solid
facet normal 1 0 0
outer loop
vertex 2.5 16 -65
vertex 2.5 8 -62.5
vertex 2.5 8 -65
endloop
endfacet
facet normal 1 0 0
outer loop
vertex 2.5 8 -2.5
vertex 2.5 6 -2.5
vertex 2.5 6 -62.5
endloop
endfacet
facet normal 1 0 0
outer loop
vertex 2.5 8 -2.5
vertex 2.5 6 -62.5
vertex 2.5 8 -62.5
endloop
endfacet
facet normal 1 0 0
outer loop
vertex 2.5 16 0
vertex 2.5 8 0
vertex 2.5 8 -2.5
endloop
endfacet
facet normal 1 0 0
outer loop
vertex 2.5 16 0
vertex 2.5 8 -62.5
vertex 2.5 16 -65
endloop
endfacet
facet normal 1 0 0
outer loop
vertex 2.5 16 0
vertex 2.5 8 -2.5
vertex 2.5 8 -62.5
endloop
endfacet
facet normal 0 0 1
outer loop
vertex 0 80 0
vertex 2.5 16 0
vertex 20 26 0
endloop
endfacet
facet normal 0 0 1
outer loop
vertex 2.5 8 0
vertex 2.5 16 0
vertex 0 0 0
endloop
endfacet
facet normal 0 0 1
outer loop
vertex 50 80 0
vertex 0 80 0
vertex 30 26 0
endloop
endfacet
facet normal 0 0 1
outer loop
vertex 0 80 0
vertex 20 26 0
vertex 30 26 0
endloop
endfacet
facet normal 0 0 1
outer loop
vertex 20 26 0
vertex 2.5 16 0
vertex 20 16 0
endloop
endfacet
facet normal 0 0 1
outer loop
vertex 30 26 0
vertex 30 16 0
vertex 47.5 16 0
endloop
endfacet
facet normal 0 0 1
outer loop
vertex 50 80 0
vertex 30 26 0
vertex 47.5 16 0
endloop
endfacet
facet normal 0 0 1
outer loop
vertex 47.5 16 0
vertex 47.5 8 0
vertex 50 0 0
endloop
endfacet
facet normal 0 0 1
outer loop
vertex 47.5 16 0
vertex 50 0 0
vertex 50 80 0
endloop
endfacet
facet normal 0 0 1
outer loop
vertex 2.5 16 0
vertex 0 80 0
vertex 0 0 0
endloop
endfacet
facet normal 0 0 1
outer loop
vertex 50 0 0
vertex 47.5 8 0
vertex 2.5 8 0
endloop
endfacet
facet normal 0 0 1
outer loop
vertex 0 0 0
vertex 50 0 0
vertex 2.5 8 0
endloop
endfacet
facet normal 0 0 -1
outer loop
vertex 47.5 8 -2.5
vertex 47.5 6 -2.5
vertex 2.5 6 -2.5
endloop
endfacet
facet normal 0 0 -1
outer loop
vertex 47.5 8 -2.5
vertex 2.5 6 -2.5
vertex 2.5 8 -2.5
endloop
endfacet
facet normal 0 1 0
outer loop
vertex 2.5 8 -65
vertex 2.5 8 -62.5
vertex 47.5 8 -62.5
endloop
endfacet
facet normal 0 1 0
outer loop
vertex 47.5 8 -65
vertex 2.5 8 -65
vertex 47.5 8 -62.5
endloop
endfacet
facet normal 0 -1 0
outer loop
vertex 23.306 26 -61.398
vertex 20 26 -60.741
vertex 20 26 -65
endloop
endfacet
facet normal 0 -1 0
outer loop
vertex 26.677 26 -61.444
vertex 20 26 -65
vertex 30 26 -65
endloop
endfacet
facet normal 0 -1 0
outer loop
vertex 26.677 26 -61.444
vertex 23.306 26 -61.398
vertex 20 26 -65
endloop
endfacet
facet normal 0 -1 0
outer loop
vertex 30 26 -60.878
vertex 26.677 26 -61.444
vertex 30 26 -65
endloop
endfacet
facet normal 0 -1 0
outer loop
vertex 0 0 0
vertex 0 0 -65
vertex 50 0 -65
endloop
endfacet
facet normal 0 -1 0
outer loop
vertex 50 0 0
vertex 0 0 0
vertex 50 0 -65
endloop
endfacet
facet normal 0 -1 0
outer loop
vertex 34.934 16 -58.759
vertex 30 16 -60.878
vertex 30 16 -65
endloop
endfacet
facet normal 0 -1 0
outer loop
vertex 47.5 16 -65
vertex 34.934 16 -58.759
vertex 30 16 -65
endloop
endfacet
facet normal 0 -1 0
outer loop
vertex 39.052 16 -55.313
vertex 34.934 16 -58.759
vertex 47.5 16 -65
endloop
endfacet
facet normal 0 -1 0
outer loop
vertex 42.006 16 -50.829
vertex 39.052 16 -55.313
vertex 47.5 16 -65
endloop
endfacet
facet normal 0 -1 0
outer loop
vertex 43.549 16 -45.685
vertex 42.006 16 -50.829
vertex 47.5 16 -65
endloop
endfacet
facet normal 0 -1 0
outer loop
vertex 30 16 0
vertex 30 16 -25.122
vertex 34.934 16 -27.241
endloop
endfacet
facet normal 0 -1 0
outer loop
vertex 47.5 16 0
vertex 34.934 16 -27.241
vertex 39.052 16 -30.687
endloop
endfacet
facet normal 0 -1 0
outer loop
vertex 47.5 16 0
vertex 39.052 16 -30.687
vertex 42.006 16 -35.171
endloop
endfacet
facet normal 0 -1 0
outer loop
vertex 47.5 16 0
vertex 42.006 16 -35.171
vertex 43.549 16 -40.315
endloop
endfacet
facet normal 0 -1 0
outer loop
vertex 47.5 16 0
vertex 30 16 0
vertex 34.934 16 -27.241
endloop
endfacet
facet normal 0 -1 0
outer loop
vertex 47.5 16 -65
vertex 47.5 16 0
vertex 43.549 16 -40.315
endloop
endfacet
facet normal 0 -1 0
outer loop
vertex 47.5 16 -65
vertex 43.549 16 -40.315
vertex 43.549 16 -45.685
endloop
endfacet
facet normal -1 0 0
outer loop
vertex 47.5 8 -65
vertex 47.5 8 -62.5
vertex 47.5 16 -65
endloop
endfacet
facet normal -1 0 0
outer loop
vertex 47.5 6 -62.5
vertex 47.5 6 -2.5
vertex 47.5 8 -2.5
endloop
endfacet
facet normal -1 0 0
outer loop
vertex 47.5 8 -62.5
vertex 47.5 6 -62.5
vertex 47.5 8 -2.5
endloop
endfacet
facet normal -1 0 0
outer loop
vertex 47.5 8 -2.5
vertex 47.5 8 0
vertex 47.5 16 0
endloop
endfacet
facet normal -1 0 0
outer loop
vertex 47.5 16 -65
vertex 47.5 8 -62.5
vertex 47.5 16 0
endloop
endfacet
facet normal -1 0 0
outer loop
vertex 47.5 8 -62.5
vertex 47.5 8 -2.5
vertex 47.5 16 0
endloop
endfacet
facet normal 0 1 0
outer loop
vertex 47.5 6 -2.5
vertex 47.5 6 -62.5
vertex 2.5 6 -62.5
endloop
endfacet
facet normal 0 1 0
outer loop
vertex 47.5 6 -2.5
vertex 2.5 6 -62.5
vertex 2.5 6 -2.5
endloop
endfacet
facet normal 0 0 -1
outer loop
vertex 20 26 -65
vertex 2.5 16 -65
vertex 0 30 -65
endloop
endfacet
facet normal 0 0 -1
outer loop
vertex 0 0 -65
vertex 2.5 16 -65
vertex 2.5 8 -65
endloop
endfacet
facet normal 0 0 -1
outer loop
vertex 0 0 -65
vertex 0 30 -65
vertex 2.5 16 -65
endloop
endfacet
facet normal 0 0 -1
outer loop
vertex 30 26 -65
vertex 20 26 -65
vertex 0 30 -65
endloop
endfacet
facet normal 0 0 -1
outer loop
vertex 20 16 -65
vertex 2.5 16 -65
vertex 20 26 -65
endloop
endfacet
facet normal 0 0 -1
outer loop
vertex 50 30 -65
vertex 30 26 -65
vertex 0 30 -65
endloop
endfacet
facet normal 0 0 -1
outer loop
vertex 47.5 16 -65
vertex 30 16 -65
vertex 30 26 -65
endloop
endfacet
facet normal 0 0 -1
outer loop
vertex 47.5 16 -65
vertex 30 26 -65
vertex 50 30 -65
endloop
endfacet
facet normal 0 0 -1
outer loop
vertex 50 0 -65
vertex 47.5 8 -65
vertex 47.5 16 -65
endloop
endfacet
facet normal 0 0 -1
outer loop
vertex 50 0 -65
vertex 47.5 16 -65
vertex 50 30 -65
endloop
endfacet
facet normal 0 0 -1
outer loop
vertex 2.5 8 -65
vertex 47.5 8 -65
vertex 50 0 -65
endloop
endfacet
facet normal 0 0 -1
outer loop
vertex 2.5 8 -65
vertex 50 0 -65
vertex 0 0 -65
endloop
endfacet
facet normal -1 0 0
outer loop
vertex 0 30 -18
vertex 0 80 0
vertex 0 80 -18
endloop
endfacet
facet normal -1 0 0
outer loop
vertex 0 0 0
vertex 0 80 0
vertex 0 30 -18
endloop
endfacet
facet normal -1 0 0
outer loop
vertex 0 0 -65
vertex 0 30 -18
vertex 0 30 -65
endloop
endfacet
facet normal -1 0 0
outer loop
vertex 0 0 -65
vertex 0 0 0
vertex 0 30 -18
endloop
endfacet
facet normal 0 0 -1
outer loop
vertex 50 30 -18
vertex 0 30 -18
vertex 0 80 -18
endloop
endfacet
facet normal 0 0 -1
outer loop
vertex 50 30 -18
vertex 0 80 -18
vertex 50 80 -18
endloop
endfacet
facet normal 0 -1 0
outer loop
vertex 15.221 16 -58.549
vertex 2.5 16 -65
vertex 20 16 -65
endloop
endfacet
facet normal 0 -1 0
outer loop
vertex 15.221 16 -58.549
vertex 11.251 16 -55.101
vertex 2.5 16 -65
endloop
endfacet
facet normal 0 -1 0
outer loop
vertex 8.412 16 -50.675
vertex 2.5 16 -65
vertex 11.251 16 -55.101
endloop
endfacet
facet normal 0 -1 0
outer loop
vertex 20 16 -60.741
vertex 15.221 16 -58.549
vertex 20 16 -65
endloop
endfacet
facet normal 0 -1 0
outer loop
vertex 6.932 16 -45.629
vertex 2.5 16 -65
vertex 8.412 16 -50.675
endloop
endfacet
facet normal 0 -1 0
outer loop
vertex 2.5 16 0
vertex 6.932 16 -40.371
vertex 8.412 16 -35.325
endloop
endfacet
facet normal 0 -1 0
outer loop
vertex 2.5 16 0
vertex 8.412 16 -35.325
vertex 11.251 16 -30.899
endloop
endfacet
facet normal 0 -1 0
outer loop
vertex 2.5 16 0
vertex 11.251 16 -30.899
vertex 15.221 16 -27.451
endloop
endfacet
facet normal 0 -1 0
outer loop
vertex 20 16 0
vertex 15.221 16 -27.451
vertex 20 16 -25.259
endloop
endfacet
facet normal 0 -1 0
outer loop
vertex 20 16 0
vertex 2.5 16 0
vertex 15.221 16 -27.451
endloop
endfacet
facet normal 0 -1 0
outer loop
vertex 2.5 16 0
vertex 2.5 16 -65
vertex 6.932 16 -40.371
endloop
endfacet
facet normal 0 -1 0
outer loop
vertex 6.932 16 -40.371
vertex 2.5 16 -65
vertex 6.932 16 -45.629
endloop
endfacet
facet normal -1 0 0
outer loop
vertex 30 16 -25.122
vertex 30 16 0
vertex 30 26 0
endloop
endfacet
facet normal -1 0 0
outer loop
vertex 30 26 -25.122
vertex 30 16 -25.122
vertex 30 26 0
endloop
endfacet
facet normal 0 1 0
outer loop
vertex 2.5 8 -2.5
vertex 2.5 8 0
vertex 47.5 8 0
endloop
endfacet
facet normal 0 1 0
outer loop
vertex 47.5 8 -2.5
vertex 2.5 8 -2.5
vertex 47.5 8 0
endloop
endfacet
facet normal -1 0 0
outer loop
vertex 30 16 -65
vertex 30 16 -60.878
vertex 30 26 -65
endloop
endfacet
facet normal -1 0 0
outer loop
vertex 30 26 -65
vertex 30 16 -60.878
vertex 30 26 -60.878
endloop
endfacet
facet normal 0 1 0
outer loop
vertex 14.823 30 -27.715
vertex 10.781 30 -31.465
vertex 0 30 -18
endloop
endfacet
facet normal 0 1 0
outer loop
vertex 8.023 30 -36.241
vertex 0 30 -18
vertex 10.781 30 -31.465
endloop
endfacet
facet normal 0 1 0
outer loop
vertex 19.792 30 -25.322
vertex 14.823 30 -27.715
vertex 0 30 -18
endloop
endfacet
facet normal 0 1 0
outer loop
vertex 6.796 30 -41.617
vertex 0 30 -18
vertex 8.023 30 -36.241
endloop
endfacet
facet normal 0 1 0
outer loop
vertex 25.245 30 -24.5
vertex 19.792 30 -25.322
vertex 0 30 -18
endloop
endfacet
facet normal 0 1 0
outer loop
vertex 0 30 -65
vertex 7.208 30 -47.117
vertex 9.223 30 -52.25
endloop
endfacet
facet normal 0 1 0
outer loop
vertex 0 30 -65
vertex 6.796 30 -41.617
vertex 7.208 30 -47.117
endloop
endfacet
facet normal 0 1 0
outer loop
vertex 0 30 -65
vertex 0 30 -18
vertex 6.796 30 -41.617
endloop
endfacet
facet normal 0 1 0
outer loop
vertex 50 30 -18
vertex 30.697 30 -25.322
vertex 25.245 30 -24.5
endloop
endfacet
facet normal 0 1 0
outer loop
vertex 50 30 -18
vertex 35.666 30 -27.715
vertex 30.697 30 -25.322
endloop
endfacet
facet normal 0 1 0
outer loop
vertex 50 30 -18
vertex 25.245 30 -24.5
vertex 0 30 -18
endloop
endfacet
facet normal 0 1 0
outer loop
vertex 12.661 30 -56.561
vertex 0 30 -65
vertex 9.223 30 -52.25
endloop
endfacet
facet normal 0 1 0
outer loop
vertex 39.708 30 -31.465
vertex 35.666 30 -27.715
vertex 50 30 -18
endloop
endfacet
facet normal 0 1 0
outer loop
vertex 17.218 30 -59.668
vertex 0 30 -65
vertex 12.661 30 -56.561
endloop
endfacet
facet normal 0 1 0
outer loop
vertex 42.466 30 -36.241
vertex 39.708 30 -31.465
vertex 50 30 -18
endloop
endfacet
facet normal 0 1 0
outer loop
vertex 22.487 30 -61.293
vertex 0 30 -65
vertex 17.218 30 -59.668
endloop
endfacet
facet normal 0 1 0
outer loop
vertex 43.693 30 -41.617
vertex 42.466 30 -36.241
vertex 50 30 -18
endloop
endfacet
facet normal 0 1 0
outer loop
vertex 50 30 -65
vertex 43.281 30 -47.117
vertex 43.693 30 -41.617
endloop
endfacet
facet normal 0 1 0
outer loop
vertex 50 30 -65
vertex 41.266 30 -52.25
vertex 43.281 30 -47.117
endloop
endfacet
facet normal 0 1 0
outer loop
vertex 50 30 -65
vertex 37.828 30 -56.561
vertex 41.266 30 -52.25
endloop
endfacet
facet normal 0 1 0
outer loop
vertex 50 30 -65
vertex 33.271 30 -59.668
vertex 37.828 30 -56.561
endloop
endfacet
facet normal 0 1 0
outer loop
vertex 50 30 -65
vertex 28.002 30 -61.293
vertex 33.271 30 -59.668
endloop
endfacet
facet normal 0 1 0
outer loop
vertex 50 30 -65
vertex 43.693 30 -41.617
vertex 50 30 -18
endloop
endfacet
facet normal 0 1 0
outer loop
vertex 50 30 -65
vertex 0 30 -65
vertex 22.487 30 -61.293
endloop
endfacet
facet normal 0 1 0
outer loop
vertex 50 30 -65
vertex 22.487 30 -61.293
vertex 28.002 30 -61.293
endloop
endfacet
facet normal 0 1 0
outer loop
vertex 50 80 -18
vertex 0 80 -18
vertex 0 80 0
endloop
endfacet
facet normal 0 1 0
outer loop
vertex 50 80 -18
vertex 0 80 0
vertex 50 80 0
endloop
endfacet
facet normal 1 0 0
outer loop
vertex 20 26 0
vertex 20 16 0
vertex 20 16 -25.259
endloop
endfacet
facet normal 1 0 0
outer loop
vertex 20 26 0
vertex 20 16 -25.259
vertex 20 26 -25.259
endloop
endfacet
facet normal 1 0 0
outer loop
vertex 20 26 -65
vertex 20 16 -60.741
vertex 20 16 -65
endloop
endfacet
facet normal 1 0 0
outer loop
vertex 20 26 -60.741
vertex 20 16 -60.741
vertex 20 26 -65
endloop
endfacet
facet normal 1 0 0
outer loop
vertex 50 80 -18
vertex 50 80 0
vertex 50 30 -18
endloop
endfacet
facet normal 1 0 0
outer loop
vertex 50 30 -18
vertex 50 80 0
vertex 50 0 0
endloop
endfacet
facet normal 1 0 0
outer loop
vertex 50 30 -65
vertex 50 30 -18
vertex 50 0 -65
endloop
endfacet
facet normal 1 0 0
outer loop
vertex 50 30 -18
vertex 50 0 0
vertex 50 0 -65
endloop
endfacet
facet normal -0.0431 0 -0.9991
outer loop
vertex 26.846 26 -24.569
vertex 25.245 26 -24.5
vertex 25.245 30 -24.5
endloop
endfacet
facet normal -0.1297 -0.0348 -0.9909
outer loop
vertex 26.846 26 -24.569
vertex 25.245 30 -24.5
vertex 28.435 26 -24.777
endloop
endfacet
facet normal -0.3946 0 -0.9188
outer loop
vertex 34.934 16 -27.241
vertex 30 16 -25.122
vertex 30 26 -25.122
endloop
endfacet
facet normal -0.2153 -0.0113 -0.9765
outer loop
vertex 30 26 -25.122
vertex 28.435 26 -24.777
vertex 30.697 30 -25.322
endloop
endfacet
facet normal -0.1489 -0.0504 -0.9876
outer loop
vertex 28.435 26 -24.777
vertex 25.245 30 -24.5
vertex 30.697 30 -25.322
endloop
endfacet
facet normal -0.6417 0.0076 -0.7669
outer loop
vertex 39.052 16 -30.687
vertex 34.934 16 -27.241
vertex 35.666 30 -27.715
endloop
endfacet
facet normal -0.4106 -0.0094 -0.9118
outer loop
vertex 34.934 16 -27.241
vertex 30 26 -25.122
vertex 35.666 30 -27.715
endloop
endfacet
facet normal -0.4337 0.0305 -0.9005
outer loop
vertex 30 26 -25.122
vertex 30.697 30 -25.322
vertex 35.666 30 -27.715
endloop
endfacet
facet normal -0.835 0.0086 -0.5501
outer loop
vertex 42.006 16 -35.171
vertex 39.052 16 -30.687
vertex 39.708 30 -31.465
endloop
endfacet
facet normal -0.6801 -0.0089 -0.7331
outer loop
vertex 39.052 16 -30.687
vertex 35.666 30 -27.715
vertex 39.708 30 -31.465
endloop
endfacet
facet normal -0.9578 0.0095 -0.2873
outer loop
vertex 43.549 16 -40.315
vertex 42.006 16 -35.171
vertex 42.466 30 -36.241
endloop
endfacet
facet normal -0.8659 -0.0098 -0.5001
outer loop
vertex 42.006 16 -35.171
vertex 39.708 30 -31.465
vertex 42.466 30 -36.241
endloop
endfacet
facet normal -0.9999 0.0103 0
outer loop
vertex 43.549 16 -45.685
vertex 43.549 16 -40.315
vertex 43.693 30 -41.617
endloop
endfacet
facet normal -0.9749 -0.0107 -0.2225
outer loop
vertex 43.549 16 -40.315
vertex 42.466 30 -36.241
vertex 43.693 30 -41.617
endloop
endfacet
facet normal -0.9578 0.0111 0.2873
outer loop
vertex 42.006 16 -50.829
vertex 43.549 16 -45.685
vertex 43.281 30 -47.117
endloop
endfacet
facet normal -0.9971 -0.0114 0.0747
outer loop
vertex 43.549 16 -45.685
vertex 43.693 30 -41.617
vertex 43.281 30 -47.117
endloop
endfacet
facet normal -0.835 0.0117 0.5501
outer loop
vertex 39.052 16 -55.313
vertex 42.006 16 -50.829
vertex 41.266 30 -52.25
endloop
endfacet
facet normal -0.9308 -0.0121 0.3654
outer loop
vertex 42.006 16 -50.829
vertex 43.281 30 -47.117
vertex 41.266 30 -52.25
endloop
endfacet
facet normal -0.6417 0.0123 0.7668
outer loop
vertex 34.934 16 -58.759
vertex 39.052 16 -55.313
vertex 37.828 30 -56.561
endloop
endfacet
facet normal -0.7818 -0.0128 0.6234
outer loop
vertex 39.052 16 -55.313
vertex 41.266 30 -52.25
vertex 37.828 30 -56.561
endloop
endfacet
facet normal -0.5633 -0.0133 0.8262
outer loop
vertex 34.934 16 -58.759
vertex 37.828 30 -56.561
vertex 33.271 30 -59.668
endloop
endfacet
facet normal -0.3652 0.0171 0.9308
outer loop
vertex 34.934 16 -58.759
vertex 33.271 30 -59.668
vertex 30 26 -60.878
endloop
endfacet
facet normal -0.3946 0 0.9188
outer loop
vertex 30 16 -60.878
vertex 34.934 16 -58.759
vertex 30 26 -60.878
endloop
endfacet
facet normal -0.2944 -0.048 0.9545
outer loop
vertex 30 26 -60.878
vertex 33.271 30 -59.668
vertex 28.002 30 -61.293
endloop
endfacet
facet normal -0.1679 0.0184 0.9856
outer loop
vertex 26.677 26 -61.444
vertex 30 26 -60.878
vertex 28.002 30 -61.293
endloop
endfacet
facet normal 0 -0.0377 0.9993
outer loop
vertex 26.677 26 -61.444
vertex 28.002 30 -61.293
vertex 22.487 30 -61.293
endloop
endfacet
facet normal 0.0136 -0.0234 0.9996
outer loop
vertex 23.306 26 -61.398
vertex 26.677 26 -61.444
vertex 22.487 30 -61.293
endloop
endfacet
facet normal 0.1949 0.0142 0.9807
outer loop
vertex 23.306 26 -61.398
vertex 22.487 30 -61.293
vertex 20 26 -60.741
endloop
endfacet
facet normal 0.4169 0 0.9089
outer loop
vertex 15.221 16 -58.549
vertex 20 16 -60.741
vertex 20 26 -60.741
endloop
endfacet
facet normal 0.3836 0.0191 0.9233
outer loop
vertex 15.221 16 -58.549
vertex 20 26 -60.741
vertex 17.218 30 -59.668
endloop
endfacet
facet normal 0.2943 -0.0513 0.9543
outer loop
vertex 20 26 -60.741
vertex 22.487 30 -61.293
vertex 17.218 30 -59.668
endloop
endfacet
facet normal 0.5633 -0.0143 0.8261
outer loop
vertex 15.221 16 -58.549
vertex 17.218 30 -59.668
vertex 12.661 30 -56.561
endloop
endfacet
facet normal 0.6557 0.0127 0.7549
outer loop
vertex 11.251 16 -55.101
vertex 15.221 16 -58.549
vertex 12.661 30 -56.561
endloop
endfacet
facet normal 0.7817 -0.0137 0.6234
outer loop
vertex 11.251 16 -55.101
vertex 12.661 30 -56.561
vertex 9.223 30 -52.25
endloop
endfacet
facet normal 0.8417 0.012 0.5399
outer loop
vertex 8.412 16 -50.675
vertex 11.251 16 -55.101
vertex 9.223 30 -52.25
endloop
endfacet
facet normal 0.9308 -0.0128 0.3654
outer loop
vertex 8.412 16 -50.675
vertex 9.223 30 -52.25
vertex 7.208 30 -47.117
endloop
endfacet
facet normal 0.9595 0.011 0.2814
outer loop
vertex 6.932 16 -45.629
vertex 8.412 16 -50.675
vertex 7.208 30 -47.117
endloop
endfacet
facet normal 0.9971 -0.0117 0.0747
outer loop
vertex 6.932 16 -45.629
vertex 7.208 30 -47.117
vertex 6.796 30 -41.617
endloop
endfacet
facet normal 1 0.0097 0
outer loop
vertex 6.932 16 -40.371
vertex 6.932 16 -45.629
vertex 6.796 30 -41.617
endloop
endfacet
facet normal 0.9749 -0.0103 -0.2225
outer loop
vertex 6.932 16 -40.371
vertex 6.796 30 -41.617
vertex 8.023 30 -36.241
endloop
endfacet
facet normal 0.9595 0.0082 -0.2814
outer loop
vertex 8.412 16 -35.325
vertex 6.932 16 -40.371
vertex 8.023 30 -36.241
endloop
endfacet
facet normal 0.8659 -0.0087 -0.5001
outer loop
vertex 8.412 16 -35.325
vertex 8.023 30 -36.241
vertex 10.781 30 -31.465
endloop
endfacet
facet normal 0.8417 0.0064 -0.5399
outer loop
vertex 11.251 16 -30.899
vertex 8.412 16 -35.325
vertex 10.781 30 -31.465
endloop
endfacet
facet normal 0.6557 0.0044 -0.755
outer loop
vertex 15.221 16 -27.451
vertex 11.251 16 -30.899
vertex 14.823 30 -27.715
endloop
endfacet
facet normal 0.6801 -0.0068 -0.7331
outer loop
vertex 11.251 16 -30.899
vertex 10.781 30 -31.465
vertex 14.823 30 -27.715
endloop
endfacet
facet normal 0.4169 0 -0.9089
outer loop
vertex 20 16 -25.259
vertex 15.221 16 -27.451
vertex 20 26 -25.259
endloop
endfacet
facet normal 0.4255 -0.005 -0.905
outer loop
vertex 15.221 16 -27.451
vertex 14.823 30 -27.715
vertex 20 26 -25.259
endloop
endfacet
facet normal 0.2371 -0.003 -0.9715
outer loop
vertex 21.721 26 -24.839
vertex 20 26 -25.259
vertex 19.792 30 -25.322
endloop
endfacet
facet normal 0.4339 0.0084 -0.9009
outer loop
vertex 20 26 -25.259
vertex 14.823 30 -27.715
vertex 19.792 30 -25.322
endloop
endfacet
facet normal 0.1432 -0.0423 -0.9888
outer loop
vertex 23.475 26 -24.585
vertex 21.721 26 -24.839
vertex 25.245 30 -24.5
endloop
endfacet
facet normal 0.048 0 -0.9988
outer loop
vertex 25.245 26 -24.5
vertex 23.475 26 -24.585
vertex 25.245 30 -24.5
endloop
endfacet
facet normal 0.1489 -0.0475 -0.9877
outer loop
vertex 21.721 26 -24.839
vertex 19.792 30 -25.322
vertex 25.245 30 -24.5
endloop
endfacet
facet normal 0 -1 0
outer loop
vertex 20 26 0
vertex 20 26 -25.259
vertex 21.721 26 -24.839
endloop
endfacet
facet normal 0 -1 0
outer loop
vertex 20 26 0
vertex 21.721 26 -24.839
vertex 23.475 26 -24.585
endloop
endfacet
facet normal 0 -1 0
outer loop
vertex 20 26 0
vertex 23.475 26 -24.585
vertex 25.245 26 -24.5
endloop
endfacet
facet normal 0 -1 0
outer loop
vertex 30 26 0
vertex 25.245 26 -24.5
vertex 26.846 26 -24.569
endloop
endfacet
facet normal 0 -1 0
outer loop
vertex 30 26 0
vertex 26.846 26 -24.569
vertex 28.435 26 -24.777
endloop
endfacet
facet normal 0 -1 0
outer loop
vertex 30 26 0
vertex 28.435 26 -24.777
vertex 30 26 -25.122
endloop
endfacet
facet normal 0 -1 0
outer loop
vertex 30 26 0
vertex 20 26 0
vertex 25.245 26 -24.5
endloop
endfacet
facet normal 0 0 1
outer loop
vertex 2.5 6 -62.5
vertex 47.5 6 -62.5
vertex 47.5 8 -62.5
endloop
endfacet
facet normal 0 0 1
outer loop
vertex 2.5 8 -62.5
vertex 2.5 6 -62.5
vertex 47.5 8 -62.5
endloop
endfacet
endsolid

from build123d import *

# Parameters (mm, degrees)
SKETCH1_W           = 50
SKETCH1_H           = 65
BOSS_EXTRUDE1_DEPTH = 30
SKETCH3_W           = 10
SKETCH3_H           = 10
SKETCH3_W_2         = 45
SKETCH3_H_2         = 8
CUT_EXTRUDE4_DEPTH  = 88.321245983
SKETCH4_W           = 60
SKETCH4_H           = 2
CUT_EXTRUDE5_DEPTH  = 45
CUT_EXTRUDE6_REACH  = 89.321
SKETCH5_R           = 18.5
SKETCH6_W           = 50
SKETCH6_H           = 18
BOSS_EXTRUDE2_DEPTH = 50


with BuildPart() as part:
    # Sketch1 → Boss-Extrude1 (new body)
    with BuildSketch(Plane(origin=(0, 0, 0), x_dir=(1, 0, 0), z_dir=(0, 1, 0))):
        with Locations((25, 32.5)):
            Rectangle(SKETCH1_W, SKETCH1_H)
    extrude(amount=BOSS_EXTRUDE1_DEPTH)

    # Sketch3 → Cut-Extrude4 (cut, through all)
    with BuildSketch(Plane.XY):
        with Locations((25, 21)):
            Rectangle(SKETCH3_W, SKETCH3_H)
        with Locations((25, 12)):
            Rectangle(SKETCH3_W_2, SKETCH3_H_2)
    extrude(amount=-CUT_EXTRUDE4_DEPTH, mode=Mode.SUBTRACT)

    # Sketch4 → Cut-Extrude5 (cut)
    with BuildSketch(Plane.ZY.offset(-47.5)):
        with Locations((-32.5, 7)):
            Rectangle(SKETCH4_W, SKETCH4_H)
    extrude(amount=CUT_EXTRUDE5_DEPTH, mode=Mode.SUBTRACT)

    # Cut-Extrude6: up to this face of the body (flat: up to its plane)
    cut_extrude6_end = Plane(part.part.faces().sort_by_distance((11.25, 16, -32.5))[0])
    # Sketch5 → Cut-Extrude6 (cut, up to the picked face)
    with BuildSketch(Plane(origin=(0, 30, 0), x_dir=(1, 0, 0), z_dir=(0, 1, 0)), mode=Mode.PRIVATE) as cut_extrude6_sk1:
        with Locations(Location((25.244510865, 43, 0), (0, 0, 270))):
            Circle(SKETCH5_R)
    cut_extrude6_tool1 = split(extrude(cut_extrude6_sk1.sketch, amount=-CUT_EXTRUDE6_REACH, mode=Mode.PRIVATE), bisect_by=cut_extrude6_end, keep=Keep.BOTH, mode=Mode.PRIVATE)
    add(cut_extrude6_tool1.solids().sort_by(Axis((25.244511, 30, -43), (0, -1, 0)))[0], mode=Mode.SUBTRACT)

    # Sketch6 → Boss-Extrude2 (add)
    with BuildSketch(Plane(origin=(0, 30, 0), x_dir=(1, 0, 0), z_dir=(0, 1, 0))):
        with Locations((25, 9)):
            Rectangle(SKETCH6_W, SKETCH6_H)
    extrude(amount=BOSS_EXTRUDE2_DEPTH)


solid = part.part
